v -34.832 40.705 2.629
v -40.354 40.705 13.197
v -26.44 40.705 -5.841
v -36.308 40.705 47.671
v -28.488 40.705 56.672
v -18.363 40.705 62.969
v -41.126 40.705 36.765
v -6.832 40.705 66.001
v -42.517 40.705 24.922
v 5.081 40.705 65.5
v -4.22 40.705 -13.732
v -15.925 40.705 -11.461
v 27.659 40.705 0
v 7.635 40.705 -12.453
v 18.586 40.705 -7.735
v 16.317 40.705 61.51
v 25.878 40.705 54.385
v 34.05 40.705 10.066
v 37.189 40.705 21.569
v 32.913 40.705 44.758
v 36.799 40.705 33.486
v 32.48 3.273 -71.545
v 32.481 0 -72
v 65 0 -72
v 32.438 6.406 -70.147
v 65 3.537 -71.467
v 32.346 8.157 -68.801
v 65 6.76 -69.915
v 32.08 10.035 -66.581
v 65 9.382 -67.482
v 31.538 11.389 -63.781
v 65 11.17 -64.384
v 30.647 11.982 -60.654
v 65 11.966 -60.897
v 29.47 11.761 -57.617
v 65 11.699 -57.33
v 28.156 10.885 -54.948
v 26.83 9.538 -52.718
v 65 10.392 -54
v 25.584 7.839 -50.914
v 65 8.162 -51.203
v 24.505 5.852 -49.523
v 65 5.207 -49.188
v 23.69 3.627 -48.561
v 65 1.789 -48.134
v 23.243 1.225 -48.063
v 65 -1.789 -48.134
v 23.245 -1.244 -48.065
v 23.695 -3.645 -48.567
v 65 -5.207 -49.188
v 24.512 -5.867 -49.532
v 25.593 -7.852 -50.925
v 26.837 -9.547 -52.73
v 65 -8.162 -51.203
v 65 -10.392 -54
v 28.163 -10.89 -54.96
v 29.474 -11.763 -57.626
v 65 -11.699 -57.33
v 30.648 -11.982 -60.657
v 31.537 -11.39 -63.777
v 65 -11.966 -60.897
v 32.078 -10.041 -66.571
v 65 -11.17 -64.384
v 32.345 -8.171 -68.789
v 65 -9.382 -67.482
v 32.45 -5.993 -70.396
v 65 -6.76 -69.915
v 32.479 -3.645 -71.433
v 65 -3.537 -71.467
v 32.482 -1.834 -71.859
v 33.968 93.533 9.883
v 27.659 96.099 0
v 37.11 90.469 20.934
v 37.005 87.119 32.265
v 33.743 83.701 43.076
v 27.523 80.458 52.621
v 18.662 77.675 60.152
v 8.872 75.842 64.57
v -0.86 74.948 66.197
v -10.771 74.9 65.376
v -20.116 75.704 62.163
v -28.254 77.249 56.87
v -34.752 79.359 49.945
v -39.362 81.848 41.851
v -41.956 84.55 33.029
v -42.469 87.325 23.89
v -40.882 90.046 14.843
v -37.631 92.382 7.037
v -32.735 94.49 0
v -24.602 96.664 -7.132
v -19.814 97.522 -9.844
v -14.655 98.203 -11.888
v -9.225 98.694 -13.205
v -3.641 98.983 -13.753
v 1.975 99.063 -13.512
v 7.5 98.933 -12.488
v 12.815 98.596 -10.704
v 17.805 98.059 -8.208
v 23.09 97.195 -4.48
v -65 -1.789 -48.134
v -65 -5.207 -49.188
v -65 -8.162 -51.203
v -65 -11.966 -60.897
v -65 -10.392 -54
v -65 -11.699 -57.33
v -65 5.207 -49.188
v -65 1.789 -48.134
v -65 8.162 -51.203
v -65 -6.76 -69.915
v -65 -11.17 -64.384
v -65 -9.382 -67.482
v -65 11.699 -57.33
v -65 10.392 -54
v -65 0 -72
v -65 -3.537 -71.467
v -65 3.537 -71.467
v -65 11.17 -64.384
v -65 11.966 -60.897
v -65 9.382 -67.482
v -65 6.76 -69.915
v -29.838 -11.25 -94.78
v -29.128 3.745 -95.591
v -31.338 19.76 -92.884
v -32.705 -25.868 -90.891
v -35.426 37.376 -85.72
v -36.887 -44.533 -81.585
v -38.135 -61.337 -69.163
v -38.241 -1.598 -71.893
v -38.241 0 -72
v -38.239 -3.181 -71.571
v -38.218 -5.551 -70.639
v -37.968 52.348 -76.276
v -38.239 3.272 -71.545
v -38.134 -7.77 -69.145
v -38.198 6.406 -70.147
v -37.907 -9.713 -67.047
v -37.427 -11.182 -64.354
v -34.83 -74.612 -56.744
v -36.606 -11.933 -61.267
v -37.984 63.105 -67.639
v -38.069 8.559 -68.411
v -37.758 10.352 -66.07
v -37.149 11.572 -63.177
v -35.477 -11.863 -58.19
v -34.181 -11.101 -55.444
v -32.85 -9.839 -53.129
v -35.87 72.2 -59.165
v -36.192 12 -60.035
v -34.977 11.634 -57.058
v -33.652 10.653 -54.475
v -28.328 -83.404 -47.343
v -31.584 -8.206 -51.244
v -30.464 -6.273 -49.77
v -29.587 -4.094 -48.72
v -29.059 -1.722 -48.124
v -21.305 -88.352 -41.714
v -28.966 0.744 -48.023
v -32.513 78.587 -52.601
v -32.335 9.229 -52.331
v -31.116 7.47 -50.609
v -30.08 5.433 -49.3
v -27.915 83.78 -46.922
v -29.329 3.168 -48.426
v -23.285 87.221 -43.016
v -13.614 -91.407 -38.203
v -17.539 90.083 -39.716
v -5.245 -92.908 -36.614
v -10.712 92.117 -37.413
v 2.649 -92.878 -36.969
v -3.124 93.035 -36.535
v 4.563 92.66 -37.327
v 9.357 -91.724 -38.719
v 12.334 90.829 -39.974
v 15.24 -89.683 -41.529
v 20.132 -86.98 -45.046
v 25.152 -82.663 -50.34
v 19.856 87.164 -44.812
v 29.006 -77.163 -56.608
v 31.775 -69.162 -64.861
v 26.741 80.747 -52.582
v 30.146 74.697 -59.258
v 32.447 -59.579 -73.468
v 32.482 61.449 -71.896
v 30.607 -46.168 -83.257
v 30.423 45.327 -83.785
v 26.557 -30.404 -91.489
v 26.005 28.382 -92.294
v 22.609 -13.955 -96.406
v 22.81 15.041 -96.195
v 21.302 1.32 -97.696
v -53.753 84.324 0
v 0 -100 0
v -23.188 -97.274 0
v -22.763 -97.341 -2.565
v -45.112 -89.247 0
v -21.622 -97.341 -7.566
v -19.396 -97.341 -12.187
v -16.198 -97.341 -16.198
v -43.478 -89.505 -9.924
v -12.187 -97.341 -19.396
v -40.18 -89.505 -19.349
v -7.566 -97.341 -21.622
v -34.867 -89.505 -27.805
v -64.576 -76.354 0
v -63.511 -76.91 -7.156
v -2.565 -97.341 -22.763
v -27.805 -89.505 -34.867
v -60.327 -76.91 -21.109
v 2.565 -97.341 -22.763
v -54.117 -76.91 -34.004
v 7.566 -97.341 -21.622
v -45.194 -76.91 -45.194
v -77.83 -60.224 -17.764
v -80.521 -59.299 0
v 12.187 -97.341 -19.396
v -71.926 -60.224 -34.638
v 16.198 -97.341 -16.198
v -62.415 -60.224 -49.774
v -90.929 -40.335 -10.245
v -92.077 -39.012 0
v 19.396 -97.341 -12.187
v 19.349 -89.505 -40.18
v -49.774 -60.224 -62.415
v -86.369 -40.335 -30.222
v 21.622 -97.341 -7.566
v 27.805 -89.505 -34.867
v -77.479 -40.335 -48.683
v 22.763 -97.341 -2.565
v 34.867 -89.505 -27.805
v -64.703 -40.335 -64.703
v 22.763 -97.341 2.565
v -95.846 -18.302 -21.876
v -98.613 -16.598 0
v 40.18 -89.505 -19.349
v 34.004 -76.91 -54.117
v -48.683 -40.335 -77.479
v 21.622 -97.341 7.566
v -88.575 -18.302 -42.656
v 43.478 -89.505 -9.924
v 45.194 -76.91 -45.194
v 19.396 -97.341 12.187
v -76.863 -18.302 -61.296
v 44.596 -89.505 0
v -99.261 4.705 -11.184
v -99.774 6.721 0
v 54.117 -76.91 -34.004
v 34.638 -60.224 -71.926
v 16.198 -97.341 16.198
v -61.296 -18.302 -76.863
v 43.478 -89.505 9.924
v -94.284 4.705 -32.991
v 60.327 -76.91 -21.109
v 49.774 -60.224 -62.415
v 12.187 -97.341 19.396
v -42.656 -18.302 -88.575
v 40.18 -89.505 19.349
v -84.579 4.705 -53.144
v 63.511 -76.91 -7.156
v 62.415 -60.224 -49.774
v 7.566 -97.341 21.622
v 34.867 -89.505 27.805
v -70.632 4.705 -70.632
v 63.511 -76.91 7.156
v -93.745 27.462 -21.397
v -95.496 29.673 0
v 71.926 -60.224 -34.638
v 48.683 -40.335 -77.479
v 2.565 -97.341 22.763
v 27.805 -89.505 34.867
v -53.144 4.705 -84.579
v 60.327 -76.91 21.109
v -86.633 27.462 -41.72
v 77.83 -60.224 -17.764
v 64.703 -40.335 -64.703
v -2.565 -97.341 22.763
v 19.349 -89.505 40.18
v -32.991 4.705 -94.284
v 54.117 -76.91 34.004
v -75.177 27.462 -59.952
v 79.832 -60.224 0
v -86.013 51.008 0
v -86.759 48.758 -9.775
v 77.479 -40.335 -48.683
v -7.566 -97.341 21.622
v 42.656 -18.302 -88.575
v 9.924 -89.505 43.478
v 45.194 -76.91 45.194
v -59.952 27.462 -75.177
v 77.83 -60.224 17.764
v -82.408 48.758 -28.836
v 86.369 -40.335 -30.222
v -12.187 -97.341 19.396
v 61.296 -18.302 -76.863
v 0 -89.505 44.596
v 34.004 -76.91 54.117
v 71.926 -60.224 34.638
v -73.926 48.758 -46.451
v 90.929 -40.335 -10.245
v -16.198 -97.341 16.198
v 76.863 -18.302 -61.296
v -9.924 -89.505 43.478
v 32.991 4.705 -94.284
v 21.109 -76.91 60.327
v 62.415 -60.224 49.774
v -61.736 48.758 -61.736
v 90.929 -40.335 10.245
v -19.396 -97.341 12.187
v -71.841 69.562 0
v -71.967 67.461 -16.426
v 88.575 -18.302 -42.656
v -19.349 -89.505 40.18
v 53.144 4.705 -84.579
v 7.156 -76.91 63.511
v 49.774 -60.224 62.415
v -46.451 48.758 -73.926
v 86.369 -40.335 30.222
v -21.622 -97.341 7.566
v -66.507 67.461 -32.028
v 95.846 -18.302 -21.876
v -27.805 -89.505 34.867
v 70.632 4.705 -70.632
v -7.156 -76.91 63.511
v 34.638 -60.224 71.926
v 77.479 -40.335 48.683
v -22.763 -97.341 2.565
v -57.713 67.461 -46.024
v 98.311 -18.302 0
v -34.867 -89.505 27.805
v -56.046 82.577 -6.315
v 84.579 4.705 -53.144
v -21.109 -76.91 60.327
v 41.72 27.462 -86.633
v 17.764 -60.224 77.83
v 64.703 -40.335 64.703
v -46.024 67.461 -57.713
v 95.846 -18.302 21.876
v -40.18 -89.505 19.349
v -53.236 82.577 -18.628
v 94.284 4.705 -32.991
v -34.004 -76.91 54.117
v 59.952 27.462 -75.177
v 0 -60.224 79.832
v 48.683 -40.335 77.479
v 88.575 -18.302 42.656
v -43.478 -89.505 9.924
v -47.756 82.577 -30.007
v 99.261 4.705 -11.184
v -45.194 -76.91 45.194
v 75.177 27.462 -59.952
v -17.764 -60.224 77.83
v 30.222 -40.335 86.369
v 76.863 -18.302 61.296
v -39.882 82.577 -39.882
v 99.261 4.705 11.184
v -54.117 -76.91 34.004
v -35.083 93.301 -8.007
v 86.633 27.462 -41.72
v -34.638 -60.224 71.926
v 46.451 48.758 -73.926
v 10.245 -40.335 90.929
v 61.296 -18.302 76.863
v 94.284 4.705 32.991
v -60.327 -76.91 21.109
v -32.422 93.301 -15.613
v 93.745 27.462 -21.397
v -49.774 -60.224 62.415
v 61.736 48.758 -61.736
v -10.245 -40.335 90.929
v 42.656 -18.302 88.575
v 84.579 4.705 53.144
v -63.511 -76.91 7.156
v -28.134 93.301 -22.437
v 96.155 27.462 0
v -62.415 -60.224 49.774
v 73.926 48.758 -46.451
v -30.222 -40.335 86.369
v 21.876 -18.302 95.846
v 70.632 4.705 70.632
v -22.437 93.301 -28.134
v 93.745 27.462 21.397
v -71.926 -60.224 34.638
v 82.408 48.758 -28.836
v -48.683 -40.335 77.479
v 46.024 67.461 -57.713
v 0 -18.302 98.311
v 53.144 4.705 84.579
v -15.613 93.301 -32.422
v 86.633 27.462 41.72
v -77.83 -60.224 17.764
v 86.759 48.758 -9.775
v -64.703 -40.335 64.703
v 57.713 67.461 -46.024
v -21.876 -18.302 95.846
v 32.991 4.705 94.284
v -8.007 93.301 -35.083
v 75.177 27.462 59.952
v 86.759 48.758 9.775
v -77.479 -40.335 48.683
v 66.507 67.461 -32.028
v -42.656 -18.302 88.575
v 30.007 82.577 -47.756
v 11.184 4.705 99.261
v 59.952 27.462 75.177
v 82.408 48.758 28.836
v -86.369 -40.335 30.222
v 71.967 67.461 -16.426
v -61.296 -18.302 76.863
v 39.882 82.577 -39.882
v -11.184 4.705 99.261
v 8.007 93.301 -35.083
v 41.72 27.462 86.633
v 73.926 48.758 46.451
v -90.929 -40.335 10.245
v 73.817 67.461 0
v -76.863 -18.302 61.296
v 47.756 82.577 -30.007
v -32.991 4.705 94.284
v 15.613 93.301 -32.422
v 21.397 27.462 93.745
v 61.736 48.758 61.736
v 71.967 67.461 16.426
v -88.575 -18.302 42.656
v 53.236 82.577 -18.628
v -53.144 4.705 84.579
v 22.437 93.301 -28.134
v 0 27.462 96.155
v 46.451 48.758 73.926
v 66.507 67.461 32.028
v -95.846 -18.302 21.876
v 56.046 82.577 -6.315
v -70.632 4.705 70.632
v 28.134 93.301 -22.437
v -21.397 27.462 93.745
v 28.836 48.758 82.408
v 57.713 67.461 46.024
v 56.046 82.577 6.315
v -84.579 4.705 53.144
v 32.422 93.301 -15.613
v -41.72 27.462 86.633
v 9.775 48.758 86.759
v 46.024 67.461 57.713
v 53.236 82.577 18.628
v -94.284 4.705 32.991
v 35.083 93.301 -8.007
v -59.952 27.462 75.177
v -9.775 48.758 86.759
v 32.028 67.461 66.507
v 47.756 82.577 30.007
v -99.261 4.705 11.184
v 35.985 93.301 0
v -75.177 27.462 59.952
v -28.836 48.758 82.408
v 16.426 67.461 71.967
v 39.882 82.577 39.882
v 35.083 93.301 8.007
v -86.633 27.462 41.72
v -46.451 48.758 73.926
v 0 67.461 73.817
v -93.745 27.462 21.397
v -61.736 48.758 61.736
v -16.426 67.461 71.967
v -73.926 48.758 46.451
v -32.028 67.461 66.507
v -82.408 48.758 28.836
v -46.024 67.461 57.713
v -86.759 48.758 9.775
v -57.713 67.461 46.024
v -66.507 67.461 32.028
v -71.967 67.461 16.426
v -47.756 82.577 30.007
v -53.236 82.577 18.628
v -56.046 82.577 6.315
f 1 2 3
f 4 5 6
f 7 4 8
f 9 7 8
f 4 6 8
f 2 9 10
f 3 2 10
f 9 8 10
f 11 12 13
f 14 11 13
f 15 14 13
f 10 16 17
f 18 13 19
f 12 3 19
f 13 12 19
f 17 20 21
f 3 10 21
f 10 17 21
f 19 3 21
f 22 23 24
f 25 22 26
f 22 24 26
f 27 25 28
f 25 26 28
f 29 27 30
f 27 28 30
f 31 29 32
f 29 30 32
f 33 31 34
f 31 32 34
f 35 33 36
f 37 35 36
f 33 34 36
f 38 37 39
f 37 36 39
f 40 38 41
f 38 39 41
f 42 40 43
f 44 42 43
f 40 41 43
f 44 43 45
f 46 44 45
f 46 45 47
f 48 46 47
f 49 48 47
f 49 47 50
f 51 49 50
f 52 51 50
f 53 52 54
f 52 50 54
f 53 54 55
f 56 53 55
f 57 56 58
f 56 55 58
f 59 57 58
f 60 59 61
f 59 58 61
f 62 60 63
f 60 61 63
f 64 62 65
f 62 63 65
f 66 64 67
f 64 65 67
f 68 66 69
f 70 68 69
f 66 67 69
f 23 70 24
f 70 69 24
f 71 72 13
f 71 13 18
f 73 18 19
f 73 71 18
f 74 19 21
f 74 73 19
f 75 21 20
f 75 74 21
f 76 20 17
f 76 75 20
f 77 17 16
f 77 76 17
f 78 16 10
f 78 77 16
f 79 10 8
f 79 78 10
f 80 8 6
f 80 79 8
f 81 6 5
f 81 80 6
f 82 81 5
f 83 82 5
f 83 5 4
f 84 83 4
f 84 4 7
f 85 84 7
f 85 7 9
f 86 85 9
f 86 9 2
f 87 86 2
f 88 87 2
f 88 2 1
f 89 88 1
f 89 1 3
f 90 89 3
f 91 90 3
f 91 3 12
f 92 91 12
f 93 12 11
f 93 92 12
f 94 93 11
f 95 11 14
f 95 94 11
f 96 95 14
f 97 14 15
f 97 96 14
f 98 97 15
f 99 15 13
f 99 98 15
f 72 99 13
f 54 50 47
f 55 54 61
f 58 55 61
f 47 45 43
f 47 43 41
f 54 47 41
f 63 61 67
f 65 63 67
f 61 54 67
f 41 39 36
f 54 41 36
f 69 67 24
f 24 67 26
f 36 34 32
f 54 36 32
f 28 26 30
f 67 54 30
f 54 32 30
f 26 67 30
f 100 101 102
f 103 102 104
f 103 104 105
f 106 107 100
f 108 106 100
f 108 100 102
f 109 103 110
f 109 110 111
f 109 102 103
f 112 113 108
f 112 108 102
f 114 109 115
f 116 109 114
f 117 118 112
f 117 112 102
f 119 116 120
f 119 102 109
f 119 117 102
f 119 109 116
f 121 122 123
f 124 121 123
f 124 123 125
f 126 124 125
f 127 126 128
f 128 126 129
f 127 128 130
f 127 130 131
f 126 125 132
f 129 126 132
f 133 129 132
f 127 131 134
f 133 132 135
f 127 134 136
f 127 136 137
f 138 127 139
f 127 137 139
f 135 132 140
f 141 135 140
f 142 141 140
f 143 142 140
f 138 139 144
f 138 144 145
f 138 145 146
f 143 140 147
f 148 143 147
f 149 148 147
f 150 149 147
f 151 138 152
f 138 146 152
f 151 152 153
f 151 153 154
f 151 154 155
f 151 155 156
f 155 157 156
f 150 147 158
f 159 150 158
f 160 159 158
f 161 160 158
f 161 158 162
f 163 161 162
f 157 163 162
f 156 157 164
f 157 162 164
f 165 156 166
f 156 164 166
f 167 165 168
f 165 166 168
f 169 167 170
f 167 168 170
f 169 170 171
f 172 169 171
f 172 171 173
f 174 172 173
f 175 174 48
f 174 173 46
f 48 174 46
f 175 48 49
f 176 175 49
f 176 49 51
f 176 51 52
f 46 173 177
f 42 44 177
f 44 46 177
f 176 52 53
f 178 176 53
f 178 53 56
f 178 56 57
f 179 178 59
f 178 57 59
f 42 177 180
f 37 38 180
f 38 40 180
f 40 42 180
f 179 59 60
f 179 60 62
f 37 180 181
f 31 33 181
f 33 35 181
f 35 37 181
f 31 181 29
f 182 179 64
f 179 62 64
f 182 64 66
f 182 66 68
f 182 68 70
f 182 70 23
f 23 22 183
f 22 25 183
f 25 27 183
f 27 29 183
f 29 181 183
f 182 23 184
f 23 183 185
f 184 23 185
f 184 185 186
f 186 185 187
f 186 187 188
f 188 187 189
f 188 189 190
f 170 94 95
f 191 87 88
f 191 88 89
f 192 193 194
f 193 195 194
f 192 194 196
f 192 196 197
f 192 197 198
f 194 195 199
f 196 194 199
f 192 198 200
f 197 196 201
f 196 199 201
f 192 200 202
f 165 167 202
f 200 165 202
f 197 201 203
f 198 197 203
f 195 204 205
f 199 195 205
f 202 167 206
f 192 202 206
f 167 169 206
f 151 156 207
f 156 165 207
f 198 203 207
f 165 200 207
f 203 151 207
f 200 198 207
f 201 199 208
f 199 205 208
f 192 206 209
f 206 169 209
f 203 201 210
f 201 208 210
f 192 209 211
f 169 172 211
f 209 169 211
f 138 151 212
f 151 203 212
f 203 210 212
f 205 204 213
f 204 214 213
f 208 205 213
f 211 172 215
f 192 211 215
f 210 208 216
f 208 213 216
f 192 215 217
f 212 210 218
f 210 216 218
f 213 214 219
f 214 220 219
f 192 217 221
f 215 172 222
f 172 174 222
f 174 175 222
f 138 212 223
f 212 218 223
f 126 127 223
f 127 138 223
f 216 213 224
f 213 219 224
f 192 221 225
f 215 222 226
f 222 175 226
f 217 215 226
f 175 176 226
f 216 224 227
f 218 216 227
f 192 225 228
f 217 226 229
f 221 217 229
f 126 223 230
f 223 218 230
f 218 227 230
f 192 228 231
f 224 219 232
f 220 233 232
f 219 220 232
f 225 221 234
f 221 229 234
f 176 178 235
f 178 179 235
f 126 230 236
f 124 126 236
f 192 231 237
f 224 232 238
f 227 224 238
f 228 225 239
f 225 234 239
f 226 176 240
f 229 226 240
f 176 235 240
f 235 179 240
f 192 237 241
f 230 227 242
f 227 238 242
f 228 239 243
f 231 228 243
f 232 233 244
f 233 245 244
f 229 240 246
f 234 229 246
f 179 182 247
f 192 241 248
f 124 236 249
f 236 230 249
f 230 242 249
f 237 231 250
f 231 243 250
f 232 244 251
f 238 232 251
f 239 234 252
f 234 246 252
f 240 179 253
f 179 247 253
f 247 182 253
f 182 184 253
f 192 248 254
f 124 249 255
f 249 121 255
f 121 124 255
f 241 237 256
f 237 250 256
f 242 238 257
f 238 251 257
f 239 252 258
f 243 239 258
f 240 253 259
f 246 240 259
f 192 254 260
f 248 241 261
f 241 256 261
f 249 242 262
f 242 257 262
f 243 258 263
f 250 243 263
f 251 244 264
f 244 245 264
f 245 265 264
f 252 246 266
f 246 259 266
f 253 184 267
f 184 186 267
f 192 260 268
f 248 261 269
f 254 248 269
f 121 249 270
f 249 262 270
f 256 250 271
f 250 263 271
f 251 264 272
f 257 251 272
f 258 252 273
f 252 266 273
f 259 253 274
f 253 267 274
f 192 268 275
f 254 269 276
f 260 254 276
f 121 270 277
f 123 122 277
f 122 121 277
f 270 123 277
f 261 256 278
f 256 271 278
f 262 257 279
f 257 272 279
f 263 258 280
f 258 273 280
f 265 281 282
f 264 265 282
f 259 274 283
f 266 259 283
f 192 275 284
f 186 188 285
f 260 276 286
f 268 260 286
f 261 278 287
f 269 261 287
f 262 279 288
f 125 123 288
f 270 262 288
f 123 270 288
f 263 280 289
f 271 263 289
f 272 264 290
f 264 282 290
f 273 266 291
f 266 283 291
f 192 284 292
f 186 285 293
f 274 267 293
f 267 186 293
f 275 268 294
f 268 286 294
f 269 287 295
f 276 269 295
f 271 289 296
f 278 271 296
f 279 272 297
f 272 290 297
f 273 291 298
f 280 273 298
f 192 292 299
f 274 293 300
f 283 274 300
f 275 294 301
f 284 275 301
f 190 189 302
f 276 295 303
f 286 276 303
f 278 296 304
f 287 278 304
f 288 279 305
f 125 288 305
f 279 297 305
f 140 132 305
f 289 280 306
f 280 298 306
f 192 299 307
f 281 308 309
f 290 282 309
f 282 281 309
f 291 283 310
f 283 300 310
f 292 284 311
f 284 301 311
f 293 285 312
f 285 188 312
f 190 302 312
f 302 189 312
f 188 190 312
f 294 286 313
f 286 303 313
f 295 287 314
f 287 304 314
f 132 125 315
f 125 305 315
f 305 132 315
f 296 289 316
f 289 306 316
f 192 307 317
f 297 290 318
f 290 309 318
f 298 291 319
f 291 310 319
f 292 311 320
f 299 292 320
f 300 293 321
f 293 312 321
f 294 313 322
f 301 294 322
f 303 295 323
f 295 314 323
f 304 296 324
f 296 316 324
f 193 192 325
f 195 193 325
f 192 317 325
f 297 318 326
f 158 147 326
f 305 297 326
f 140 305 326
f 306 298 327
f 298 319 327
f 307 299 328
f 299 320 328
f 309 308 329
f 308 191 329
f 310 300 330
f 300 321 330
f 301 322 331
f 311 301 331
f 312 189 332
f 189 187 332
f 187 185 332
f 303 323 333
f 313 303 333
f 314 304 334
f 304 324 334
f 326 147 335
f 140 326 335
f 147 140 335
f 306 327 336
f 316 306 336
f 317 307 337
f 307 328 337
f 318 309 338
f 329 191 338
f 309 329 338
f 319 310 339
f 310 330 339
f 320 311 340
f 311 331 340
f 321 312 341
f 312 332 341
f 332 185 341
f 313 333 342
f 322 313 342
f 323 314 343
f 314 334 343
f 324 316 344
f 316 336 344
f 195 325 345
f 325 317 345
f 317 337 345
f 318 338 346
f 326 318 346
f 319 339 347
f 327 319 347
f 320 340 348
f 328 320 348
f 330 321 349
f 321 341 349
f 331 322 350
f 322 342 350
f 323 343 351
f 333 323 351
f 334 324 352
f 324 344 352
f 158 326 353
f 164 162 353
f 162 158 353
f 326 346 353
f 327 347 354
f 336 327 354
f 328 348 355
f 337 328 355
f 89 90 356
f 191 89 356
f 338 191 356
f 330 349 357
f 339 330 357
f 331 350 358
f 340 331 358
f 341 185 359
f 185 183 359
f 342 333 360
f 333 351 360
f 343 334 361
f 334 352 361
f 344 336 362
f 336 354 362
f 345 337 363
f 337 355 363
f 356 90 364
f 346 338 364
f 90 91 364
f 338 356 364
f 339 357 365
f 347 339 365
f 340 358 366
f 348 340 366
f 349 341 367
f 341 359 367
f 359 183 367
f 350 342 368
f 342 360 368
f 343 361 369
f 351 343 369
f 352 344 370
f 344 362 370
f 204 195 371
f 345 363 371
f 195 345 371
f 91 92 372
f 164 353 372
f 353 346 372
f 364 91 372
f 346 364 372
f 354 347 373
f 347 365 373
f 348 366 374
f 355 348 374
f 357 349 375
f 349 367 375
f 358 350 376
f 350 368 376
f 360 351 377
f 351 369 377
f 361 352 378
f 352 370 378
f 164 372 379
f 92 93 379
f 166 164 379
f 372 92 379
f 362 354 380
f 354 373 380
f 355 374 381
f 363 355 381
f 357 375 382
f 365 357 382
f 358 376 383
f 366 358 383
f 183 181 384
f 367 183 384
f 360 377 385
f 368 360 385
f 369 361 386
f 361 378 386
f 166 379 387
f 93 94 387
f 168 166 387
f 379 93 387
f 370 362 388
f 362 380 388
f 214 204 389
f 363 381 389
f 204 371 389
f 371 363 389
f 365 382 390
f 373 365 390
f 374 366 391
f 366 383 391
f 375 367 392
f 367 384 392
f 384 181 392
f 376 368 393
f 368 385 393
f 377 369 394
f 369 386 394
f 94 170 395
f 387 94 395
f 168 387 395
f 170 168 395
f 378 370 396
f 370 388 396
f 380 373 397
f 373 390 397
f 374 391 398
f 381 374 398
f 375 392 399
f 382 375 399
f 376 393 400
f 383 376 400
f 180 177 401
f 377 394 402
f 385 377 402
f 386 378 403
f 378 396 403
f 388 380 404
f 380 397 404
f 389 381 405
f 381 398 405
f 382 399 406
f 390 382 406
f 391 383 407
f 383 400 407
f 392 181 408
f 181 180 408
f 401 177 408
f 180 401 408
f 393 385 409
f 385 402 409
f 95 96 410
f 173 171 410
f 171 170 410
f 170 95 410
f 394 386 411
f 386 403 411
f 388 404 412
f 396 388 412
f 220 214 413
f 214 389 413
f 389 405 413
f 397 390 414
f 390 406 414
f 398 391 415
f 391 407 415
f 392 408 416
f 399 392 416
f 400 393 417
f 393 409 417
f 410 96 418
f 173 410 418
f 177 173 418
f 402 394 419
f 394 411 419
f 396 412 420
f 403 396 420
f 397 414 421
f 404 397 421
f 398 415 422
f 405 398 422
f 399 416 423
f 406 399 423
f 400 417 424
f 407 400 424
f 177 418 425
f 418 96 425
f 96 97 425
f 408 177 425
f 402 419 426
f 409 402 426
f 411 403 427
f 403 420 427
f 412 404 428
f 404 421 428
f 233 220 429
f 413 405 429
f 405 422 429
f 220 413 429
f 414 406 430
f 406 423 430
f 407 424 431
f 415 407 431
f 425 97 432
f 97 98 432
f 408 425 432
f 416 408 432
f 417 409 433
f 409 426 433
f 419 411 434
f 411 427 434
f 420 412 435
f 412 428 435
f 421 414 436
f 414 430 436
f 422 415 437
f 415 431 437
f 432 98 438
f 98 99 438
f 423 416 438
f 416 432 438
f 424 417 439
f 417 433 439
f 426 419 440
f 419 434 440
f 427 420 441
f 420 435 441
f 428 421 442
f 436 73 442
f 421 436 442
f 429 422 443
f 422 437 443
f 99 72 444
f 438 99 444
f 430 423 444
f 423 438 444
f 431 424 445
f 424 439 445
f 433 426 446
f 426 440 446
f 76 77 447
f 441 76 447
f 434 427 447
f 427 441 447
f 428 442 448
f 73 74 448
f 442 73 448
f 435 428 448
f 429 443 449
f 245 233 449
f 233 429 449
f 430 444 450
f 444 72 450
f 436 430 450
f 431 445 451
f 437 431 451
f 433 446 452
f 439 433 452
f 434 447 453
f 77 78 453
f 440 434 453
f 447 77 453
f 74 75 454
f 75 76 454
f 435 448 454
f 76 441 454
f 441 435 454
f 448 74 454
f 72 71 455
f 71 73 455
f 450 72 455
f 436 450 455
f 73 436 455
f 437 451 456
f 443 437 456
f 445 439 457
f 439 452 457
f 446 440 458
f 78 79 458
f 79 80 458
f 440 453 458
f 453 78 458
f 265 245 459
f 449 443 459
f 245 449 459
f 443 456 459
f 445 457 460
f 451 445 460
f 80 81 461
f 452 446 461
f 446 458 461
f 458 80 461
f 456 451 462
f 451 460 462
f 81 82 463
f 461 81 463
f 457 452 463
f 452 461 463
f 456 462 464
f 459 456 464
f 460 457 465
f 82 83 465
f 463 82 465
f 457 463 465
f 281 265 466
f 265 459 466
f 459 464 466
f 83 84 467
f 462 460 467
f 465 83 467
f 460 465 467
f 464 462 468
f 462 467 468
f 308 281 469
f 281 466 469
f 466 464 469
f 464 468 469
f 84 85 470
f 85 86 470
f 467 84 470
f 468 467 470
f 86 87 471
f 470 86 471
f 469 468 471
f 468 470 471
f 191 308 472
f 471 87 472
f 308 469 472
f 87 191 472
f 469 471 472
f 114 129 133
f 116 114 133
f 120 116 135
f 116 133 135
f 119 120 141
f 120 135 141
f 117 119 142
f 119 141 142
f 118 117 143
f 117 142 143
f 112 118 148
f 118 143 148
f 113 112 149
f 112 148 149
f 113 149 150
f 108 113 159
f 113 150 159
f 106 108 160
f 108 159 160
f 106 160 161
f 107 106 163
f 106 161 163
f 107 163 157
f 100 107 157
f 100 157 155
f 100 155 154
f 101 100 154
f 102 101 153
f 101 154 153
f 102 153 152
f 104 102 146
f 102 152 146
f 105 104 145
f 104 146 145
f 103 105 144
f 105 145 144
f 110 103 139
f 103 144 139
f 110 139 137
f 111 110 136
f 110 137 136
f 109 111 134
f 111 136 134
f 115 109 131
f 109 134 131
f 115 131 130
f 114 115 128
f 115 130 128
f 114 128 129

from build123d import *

# Parameters (mm, degrees)
SKETCH6_R          = 40
CUT_EXTRUDE3_DEPTH = 59.294788524860515
SKETCH10_R         = 35.361197
CUT_EXTRUDE6_DEPTH = 199.0000000000001
SKETCH13_R         = 11.999999999999975
CUT_EXTRUDE7_DEPTH = 65


with BuildPart() as part:
    # Sketch2 → Revolve2 (revolve)
    with BuildSketch(Plane.XY):
        with BuildLine():
            Line((0, 100), (2.776e-14, -100))
            ThreePointArc((2.776e-14, -100), (-100, 1.225e-14), (0, 100))
        make_face()
    revolve(axis=Axis((0, 100, 0), (1.4e-16, -1, 0)))

    # Sketch6 → Cut-Extrude3 (cut)
    with BuildSketch(Plane(origin=(-2.5379788603345292, 100, 26.23220958860291), x_dir=(-1, 0, 0), z_dir=(0, -1, 0))):
        with Locations(Location((0, 0, 0), (0, 0, 139.019257533))):
            Circle(SKETCH6_R)
    extrude(amount=CUT_EXTRUDE3_DEPTH, mode=Mode.SUBTRACT)

    # Sketch10 → Cut-Extrude6 (cut)
    with BuildSketch(Plane(origin=(-2.879635505276285, 100, -0.1784267377198251), x_dir=(1, 0, 0), z_dir=(0, 1, 0))):
        with Locations((0, 71.71708866685675)):
            Circle(SKETCH10_R)
    extrude(amount=-CUT_EXTRUDE6_DEPTH, mode=Mode.SUBTRACT)

    # Sketch13 → Cut-Extrude7 (cut, symmetric)
    with BuildSketch(Plane(origin=(0, 0, 0), x_dir=(0, 0, -1), z_dir=(1, 0, 0))):
        with Locations((60, 0)):
            Circle(SKETCH13_R)
    extrude(amount=CUT_EXTRUDE7_DEPTH, both=True, mode=Mode.SUBTRACT)


solid = part.part
